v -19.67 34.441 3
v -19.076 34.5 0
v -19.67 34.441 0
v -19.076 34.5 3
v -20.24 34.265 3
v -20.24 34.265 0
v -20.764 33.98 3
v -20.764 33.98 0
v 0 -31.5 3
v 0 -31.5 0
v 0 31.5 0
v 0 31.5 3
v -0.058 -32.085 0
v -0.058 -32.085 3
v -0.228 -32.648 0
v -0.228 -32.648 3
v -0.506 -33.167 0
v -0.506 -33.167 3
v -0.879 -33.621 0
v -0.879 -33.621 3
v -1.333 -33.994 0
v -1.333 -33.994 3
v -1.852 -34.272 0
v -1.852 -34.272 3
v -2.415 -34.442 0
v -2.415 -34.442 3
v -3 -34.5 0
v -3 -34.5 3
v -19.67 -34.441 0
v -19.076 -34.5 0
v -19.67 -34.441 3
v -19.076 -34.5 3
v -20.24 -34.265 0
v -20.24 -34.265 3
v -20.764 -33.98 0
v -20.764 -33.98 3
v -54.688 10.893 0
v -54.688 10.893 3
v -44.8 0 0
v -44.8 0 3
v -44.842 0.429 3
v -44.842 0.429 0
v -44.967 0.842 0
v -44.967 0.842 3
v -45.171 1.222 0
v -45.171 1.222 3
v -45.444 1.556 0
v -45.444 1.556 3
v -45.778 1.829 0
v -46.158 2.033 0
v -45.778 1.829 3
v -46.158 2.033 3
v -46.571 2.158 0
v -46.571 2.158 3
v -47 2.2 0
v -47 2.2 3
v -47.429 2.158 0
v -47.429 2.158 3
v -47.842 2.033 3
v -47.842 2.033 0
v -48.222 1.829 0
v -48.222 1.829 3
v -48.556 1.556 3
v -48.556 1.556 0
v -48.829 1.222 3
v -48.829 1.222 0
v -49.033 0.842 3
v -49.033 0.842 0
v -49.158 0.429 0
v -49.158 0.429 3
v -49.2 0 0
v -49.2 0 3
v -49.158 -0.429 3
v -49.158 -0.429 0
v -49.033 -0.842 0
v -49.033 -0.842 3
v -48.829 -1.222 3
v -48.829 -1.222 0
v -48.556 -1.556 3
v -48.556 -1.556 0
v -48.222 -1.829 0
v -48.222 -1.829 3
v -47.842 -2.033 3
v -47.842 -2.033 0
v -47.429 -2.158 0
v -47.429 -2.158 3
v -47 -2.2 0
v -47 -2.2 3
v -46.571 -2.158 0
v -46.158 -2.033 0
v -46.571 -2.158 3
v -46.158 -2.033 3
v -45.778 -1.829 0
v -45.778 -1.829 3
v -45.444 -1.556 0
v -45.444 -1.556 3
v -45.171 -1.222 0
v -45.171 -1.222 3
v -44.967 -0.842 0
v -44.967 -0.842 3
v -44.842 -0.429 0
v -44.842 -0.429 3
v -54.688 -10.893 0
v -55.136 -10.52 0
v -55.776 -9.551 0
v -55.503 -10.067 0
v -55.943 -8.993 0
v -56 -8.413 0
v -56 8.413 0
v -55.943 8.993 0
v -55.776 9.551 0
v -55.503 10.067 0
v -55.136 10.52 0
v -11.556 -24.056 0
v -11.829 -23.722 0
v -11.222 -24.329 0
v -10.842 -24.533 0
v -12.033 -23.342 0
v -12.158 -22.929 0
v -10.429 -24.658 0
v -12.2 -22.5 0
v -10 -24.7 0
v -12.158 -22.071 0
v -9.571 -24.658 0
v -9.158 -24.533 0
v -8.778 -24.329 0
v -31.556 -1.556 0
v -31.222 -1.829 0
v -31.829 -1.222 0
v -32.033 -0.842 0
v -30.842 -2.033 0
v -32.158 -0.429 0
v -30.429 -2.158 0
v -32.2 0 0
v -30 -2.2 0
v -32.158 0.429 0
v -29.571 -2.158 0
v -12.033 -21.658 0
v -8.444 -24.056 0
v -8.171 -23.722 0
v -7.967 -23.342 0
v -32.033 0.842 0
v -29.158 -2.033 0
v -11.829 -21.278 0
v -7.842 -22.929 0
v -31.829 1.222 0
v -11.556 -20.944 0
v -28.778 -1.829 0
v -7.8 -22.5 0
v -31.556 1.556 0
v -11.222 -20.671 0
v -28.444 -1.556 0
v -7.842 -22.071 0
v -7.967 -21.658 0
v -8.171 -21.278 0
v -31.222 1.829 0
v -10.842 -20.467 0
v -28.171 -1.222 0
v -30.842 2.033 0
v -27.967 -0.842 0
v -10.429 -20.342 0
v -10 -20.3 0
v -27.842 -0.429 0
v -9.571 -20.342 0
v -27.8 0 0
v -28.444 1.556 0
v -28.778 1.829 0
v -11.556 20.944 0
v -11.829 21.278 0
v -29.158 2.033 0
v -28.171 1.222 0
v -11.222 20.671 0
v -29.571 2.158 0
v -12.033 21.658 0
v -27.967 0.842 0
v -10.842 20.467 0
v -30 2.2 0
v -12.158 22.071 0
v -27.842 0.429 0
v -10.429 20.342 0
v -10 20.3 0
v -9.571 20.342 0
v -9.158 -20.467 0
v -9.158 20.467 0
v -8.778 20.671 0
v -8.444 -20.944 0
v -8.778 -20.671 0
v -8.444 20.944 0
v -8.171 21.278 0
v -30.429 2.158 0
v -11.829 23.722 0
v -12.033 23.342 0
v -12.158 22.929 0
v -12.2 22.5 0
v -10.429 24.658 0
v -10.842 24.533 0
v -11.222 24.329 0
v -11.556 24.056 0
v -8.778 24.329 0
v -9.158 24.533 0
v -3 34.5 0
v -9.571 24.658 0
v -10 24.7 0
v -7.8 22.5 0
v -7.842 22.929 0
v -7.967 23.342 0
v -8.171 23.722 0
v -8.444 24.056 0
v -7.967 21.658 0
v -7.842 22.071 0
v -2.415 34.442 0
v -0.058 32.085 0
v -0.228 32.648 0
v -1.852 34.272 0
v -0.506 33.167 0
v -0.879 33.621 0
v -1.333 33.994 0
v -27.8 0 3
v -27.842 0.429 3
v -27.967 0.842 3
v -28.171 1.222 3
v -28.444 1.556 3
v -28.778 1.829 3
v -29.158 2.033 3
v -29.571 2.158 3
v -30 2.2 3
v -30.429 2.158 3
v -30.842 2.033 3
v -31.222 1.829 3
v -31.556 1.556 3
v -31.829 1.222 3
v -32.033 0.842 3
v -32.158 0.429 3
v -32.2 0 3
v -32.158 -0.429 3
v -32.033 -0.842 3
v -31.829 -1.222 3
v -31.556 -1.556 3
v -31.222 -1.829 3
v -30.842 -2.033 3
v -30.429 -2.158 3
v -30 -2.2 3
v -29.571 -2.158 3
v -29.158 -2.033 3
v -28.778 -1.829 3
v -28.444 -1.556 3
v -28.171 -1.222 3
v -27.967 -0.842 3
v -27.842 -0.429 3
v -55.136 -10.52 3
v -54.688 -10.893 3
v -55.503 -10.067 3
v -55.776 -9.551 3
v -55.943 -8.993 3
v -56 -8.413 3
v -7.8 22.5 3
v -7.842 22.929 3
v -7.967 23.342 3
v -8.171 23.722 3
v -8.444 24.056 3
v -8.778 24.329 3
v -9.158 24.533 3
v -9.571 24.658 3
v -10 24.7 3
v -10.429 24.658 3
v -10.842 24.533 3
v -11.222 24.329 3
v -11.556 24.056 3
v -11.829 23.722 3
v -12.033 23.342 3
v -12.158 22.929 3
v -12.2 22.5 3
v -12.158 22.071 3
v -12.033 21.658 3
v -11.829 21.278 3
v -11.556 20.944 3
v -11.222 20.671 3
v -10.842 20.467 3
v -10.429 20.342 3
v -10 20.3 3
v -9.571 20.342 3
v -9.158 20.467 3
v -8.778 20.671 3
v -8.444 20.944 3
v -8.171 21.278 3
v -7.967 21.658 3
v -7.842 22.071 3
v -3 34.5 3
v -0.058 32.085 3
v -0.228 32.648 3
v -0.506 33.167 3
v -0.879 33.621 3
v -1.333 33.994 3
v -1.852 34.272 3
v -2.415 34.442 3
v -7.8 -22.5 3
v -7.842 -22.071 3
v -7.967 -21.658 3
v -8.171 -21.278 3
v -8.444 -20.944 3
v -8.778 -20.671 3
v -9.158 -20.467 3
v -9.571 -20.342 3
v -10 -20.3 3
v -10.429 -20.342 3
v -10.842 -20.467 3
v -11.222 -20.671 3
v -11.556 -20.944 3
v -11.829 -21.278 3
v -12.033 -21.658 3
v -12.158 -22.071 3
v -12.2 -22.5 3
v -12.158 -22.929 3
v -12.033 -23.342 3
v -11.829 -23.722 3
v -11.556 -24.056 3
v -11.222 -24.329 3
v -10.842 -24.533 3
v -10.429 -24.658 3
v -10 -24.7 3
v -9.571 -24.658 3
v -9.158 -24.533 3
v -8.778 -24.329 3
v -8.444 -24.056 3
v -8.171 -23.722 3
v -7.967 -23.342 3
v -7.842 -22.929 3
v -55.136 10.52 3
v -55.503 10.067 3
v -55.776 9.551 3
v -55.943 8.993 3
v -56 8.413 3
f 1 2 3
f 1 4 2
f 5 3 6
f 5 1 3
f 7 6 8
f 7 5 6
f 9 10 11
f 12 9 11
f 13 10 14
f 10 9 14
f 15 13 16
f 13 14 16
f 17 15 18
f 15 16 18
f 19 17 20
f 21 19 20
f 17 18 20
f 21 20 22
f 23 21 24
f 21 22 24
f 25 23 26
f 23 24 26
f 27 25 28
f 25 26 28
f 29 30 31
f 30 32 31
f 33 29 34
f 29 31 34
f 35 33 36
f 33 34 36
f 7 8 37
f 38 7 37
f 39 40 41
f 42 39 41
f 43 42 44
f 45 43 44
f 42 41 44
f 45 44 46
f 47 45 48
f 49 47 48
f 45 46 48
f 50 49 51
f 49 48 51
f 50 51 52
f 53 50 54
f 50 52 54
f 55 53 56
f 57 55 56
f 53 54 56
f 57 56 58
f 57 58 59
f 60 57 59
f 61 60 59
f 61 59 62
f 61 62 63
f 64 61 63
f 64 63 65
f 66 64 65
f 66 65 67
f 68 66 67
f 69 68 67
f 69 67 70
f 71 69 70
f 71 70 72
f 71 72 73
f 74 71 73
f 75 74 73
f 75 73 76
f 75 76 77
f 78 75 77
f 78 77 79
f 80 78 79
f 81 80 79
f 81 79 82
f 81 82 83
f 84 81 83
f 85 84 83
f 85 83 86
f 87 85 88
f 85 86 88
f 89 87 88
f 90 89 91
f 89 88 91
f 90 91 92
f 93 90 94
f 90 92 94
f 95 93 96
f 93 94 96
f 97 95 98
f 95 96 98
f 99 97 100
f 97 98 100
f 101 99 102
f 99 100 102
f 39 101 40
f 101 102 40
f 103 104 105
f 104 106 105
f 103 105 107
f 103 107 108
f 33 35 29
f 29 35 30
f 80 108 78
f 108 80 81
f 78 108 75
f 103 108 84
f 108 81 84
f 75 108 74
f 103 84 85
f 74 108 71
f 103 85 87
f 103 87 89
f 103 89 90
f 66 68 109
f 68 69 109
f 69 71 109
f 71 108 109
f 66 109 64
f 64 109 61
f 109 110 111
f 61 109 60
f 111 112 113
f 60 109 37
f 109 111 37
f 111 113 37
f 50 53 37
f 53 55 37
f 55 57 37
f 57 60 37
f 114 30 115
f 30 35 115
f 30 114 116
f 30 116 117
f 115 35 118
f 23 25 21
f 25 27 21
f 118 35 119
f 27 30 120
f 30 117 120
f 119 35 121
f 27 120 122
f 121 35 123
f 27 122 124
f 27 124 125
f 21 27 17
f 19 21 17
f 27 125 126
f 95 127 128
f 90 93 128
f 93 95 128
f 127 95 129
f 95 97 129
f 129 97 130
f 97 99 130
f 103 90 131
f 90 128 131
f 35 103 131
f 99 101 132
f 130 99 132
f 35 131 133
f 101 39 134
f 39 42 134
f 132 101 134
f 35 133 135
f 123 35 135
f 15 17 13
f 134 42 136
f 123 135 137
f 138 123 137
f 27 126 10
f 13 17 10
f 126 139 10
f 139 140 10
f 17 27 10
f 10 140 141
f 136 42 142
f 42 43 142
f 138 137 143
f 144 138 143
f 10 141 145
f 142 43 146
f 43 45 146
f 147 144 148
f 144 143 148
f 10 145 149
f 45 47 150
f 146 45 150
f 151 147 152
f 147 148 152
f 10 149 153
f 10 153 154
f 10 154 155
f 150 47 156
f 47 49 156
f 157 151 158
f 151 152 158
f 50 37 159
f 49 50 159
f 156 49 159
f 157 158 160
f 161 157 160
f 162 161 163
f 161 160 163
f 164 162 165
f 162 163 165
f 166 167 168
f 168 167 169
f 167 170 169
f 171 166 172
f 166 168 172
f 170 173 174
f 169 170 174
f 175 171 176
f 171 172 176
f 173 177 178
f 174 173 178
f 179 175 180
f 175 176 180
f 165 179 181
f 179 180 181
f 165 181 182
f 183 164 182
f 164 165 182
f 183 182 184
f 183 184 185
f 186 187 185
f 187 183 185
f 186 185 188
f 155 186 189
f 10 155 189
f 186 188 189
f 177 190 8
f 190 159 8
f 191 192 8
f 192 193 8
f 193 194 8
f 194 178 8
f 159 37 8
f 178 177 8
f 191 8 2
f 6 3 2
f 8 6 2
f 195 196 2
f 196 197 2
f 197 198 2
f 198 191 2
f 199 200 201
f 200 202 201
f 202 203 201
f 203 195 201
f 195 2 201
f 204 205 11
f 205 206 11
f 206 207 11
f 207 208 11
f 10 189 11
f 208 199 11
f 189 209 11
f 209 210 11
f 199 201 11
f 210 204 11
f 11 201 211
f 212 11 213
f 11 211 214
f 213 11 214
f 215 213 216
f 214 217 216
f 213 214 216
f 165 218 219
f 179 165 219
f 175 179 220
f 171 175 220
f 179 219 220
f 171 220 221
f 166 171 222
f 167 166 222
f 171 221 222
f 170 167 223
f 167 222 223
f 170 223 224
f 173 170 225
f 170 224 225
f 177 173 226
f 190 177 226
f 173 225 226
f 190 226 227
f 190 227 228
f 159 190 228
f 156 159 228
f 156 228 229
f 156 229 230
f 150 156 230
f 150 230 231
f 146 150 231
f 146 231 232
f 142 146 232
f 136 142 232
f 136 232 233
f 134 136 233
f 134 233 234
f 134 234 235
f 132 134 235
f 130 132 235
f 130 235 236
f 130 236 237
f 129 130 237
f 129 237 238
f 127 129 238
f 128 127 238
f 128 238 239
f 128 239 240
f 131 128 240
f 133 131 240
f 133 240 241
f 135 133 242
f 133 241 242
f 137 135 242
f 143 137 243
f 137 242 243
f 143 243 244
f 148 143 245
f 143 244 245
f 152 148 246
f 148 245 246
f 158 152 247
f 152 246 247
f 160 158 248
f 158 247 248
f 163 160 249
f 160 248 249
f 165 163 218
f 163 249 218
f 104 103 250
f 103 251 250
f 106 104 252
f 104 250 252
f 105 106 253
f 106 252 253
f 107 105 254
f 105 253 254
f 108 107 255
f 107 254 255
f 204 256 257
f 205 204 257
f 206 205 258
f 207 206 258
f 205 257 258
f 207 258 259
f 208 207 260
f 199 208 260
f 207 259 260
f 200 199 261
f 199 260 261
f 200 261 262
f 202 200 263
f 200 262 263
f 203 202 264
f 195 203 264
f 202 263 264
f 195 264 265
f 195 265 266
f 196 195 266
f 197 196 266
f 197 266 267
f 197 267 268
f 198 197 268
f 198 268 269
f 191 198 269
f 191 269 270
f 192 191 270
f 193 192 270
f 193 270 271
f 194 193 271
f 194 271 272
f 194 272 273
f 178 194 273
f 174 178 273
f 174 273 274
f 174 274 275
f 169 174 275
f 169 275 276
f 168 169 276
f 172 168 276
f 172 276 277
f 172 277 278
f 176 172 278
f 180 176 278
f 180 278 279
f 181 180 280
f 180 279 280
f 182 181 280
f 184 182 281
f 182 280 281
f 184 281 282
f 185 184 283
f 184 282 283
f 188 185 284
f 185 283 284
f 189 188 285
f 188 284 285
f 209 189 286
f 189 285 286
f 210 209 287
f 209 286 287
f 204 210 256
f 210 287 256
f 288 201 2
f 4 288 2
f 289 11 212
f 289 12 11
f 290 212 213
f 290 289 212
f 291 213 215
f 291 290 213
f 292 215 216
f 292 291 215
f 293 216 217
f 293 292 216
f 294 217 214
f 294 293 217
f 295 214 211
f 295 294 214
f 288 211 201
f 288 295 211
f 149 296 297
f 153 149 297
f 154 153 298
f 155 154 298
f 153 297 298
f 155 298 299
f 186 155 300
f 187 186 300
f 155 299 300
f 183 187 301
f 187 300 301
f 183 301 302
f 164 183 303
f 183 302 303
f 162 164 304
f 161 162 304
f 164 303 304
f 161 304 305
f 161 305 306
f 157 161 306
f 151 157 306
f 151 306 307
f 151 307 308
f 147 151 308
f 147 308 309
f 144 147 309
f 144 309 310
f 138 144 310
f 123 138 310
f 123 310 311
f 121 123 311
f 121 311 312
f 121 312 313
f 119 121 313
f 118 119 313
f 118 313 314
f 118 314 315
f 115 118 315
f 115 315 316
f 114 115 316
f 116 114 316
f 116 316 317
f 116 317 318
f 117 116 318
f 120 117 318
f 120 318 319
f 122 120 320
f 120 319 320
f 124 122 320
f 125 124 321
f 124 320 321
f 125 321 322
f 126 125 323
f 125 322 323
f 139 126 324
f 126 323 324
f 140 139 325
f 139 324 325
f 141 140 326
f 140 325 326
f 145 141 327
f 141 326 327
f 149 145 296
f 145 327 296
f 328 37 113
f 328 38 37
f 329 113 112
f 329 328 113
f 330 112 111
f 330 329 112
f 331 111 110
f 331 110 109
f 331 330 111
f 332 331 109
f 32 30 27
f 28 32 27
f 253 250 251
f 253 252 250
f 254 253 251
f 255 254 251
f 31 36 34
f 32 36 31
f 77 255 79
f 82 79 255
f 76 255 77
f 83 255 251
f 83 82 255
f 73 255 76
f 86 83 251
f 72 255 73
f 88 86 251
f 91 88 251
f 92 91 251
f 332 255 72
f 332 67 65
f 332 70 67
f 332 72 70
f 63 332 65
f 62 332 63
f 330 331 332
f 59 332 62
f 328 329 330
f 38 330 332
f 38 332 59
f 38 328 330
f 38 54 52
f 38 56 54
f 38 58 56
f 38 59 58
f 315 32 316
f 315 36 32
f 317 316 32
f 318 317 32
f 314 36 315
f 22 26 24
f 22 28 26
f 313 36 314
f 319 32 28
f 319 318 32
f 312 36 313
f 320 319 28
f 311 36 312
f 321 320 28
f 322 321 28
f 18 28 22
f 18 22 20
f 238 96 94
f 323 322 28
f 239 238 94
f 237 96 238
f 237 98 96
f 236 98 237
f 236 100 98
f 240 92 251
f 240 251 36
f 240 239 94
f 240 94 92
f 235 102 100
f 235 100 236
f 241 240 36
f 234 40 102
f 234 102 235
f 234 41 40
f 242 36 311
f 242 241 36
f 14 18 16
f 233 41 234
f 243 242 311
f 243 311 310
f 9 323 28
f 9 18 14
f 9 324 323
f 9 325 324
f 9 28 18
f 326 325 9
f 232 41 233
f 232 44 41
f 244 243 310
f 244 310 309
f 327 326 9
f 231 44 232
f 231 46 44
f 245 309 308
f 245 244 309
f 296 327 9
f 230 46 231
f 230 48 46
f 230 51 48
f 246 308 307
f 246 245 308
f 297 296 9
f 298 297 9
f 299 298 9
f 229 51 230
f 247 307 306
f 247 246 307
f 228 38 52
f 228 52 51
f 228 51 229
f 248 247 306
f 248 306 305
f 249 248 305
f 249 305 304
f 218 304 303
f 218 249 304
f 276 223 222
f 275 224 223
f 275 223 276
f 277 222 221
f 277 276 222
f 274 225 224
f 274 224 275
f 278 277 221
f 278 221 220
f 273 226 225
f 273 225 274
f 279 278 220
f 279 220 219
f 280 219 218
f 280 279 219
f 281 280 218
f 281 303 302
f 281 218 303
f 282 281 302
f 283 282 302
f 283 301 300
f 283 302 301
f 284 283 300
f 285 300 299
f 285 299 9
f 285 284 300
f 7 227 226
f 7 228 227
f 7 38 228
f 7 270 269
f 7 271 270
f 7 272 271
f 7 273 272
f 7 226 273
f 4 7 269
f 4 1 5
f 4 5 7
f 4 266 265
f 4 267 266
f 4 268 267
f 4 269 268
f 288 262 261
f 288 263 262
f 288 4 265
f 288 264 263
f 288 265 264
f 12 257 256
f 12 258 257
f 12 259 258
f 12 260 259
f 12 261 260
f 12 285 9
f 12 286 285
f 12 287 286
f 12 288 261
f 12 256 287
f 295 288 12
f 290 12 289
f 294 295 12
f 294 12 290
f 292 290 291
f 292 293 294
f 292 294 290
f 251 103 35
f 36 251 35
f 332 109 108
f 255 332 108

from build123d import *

# Parameters (mm, degrees)
BOSS_EXTRUDE1_DEPTH = 3
SKETCH2_R           = 2.2
CUT_EXTRUDE1_DEPTH  = 66.842615379
FILLET1_R           = 3


with BuildPart() as part:
    # Sketch1 → Boss-Extrude1 (new body)
    with BuildSketch(Plane.XY):
        Polygon((0, -34.5), (0, 34.5), (-20, 34.5), (-56, 10), (-56, -10), (-20, -34.5), align=None)
    extrude(amount=BOSS_EXTRUDE1_DEPTH)

    # Sketch2 → Cut-Extrude1 (cut, through all)
    with BuildSketch(Plane.XY.offset(3)):
        with Locations((-47, 0)):
            Circle(SKETCH2_R)
        with Locations((-30, 0)):
            Circle(SKETCH2_R)
        with Locations((-10, 22.5)):
            Circle(SKETCH2_R)
        with Locations((-10, -22.5)):
            Circle(SKETCH2_R)
    extrude(amount=-CUT_EXTRUDE1_DEPTH, mode=Mode.SUBTRACT)

    # Fillet1
    fillet1_edges = [part.edges().sort_by_distance(p)[0] for p in [
        (-20, -34.5, 1.5),
        (-56, -10, 1.5),
        (-56, 10, 1.5),
        (-20, 34.5, 1.5),
        (0, 34.5, 1.5),
        (0, -34.5, 1.5),
    ]]
    fillet(fillet1_edges, radius=FILLET1_R)


solid = part.part
